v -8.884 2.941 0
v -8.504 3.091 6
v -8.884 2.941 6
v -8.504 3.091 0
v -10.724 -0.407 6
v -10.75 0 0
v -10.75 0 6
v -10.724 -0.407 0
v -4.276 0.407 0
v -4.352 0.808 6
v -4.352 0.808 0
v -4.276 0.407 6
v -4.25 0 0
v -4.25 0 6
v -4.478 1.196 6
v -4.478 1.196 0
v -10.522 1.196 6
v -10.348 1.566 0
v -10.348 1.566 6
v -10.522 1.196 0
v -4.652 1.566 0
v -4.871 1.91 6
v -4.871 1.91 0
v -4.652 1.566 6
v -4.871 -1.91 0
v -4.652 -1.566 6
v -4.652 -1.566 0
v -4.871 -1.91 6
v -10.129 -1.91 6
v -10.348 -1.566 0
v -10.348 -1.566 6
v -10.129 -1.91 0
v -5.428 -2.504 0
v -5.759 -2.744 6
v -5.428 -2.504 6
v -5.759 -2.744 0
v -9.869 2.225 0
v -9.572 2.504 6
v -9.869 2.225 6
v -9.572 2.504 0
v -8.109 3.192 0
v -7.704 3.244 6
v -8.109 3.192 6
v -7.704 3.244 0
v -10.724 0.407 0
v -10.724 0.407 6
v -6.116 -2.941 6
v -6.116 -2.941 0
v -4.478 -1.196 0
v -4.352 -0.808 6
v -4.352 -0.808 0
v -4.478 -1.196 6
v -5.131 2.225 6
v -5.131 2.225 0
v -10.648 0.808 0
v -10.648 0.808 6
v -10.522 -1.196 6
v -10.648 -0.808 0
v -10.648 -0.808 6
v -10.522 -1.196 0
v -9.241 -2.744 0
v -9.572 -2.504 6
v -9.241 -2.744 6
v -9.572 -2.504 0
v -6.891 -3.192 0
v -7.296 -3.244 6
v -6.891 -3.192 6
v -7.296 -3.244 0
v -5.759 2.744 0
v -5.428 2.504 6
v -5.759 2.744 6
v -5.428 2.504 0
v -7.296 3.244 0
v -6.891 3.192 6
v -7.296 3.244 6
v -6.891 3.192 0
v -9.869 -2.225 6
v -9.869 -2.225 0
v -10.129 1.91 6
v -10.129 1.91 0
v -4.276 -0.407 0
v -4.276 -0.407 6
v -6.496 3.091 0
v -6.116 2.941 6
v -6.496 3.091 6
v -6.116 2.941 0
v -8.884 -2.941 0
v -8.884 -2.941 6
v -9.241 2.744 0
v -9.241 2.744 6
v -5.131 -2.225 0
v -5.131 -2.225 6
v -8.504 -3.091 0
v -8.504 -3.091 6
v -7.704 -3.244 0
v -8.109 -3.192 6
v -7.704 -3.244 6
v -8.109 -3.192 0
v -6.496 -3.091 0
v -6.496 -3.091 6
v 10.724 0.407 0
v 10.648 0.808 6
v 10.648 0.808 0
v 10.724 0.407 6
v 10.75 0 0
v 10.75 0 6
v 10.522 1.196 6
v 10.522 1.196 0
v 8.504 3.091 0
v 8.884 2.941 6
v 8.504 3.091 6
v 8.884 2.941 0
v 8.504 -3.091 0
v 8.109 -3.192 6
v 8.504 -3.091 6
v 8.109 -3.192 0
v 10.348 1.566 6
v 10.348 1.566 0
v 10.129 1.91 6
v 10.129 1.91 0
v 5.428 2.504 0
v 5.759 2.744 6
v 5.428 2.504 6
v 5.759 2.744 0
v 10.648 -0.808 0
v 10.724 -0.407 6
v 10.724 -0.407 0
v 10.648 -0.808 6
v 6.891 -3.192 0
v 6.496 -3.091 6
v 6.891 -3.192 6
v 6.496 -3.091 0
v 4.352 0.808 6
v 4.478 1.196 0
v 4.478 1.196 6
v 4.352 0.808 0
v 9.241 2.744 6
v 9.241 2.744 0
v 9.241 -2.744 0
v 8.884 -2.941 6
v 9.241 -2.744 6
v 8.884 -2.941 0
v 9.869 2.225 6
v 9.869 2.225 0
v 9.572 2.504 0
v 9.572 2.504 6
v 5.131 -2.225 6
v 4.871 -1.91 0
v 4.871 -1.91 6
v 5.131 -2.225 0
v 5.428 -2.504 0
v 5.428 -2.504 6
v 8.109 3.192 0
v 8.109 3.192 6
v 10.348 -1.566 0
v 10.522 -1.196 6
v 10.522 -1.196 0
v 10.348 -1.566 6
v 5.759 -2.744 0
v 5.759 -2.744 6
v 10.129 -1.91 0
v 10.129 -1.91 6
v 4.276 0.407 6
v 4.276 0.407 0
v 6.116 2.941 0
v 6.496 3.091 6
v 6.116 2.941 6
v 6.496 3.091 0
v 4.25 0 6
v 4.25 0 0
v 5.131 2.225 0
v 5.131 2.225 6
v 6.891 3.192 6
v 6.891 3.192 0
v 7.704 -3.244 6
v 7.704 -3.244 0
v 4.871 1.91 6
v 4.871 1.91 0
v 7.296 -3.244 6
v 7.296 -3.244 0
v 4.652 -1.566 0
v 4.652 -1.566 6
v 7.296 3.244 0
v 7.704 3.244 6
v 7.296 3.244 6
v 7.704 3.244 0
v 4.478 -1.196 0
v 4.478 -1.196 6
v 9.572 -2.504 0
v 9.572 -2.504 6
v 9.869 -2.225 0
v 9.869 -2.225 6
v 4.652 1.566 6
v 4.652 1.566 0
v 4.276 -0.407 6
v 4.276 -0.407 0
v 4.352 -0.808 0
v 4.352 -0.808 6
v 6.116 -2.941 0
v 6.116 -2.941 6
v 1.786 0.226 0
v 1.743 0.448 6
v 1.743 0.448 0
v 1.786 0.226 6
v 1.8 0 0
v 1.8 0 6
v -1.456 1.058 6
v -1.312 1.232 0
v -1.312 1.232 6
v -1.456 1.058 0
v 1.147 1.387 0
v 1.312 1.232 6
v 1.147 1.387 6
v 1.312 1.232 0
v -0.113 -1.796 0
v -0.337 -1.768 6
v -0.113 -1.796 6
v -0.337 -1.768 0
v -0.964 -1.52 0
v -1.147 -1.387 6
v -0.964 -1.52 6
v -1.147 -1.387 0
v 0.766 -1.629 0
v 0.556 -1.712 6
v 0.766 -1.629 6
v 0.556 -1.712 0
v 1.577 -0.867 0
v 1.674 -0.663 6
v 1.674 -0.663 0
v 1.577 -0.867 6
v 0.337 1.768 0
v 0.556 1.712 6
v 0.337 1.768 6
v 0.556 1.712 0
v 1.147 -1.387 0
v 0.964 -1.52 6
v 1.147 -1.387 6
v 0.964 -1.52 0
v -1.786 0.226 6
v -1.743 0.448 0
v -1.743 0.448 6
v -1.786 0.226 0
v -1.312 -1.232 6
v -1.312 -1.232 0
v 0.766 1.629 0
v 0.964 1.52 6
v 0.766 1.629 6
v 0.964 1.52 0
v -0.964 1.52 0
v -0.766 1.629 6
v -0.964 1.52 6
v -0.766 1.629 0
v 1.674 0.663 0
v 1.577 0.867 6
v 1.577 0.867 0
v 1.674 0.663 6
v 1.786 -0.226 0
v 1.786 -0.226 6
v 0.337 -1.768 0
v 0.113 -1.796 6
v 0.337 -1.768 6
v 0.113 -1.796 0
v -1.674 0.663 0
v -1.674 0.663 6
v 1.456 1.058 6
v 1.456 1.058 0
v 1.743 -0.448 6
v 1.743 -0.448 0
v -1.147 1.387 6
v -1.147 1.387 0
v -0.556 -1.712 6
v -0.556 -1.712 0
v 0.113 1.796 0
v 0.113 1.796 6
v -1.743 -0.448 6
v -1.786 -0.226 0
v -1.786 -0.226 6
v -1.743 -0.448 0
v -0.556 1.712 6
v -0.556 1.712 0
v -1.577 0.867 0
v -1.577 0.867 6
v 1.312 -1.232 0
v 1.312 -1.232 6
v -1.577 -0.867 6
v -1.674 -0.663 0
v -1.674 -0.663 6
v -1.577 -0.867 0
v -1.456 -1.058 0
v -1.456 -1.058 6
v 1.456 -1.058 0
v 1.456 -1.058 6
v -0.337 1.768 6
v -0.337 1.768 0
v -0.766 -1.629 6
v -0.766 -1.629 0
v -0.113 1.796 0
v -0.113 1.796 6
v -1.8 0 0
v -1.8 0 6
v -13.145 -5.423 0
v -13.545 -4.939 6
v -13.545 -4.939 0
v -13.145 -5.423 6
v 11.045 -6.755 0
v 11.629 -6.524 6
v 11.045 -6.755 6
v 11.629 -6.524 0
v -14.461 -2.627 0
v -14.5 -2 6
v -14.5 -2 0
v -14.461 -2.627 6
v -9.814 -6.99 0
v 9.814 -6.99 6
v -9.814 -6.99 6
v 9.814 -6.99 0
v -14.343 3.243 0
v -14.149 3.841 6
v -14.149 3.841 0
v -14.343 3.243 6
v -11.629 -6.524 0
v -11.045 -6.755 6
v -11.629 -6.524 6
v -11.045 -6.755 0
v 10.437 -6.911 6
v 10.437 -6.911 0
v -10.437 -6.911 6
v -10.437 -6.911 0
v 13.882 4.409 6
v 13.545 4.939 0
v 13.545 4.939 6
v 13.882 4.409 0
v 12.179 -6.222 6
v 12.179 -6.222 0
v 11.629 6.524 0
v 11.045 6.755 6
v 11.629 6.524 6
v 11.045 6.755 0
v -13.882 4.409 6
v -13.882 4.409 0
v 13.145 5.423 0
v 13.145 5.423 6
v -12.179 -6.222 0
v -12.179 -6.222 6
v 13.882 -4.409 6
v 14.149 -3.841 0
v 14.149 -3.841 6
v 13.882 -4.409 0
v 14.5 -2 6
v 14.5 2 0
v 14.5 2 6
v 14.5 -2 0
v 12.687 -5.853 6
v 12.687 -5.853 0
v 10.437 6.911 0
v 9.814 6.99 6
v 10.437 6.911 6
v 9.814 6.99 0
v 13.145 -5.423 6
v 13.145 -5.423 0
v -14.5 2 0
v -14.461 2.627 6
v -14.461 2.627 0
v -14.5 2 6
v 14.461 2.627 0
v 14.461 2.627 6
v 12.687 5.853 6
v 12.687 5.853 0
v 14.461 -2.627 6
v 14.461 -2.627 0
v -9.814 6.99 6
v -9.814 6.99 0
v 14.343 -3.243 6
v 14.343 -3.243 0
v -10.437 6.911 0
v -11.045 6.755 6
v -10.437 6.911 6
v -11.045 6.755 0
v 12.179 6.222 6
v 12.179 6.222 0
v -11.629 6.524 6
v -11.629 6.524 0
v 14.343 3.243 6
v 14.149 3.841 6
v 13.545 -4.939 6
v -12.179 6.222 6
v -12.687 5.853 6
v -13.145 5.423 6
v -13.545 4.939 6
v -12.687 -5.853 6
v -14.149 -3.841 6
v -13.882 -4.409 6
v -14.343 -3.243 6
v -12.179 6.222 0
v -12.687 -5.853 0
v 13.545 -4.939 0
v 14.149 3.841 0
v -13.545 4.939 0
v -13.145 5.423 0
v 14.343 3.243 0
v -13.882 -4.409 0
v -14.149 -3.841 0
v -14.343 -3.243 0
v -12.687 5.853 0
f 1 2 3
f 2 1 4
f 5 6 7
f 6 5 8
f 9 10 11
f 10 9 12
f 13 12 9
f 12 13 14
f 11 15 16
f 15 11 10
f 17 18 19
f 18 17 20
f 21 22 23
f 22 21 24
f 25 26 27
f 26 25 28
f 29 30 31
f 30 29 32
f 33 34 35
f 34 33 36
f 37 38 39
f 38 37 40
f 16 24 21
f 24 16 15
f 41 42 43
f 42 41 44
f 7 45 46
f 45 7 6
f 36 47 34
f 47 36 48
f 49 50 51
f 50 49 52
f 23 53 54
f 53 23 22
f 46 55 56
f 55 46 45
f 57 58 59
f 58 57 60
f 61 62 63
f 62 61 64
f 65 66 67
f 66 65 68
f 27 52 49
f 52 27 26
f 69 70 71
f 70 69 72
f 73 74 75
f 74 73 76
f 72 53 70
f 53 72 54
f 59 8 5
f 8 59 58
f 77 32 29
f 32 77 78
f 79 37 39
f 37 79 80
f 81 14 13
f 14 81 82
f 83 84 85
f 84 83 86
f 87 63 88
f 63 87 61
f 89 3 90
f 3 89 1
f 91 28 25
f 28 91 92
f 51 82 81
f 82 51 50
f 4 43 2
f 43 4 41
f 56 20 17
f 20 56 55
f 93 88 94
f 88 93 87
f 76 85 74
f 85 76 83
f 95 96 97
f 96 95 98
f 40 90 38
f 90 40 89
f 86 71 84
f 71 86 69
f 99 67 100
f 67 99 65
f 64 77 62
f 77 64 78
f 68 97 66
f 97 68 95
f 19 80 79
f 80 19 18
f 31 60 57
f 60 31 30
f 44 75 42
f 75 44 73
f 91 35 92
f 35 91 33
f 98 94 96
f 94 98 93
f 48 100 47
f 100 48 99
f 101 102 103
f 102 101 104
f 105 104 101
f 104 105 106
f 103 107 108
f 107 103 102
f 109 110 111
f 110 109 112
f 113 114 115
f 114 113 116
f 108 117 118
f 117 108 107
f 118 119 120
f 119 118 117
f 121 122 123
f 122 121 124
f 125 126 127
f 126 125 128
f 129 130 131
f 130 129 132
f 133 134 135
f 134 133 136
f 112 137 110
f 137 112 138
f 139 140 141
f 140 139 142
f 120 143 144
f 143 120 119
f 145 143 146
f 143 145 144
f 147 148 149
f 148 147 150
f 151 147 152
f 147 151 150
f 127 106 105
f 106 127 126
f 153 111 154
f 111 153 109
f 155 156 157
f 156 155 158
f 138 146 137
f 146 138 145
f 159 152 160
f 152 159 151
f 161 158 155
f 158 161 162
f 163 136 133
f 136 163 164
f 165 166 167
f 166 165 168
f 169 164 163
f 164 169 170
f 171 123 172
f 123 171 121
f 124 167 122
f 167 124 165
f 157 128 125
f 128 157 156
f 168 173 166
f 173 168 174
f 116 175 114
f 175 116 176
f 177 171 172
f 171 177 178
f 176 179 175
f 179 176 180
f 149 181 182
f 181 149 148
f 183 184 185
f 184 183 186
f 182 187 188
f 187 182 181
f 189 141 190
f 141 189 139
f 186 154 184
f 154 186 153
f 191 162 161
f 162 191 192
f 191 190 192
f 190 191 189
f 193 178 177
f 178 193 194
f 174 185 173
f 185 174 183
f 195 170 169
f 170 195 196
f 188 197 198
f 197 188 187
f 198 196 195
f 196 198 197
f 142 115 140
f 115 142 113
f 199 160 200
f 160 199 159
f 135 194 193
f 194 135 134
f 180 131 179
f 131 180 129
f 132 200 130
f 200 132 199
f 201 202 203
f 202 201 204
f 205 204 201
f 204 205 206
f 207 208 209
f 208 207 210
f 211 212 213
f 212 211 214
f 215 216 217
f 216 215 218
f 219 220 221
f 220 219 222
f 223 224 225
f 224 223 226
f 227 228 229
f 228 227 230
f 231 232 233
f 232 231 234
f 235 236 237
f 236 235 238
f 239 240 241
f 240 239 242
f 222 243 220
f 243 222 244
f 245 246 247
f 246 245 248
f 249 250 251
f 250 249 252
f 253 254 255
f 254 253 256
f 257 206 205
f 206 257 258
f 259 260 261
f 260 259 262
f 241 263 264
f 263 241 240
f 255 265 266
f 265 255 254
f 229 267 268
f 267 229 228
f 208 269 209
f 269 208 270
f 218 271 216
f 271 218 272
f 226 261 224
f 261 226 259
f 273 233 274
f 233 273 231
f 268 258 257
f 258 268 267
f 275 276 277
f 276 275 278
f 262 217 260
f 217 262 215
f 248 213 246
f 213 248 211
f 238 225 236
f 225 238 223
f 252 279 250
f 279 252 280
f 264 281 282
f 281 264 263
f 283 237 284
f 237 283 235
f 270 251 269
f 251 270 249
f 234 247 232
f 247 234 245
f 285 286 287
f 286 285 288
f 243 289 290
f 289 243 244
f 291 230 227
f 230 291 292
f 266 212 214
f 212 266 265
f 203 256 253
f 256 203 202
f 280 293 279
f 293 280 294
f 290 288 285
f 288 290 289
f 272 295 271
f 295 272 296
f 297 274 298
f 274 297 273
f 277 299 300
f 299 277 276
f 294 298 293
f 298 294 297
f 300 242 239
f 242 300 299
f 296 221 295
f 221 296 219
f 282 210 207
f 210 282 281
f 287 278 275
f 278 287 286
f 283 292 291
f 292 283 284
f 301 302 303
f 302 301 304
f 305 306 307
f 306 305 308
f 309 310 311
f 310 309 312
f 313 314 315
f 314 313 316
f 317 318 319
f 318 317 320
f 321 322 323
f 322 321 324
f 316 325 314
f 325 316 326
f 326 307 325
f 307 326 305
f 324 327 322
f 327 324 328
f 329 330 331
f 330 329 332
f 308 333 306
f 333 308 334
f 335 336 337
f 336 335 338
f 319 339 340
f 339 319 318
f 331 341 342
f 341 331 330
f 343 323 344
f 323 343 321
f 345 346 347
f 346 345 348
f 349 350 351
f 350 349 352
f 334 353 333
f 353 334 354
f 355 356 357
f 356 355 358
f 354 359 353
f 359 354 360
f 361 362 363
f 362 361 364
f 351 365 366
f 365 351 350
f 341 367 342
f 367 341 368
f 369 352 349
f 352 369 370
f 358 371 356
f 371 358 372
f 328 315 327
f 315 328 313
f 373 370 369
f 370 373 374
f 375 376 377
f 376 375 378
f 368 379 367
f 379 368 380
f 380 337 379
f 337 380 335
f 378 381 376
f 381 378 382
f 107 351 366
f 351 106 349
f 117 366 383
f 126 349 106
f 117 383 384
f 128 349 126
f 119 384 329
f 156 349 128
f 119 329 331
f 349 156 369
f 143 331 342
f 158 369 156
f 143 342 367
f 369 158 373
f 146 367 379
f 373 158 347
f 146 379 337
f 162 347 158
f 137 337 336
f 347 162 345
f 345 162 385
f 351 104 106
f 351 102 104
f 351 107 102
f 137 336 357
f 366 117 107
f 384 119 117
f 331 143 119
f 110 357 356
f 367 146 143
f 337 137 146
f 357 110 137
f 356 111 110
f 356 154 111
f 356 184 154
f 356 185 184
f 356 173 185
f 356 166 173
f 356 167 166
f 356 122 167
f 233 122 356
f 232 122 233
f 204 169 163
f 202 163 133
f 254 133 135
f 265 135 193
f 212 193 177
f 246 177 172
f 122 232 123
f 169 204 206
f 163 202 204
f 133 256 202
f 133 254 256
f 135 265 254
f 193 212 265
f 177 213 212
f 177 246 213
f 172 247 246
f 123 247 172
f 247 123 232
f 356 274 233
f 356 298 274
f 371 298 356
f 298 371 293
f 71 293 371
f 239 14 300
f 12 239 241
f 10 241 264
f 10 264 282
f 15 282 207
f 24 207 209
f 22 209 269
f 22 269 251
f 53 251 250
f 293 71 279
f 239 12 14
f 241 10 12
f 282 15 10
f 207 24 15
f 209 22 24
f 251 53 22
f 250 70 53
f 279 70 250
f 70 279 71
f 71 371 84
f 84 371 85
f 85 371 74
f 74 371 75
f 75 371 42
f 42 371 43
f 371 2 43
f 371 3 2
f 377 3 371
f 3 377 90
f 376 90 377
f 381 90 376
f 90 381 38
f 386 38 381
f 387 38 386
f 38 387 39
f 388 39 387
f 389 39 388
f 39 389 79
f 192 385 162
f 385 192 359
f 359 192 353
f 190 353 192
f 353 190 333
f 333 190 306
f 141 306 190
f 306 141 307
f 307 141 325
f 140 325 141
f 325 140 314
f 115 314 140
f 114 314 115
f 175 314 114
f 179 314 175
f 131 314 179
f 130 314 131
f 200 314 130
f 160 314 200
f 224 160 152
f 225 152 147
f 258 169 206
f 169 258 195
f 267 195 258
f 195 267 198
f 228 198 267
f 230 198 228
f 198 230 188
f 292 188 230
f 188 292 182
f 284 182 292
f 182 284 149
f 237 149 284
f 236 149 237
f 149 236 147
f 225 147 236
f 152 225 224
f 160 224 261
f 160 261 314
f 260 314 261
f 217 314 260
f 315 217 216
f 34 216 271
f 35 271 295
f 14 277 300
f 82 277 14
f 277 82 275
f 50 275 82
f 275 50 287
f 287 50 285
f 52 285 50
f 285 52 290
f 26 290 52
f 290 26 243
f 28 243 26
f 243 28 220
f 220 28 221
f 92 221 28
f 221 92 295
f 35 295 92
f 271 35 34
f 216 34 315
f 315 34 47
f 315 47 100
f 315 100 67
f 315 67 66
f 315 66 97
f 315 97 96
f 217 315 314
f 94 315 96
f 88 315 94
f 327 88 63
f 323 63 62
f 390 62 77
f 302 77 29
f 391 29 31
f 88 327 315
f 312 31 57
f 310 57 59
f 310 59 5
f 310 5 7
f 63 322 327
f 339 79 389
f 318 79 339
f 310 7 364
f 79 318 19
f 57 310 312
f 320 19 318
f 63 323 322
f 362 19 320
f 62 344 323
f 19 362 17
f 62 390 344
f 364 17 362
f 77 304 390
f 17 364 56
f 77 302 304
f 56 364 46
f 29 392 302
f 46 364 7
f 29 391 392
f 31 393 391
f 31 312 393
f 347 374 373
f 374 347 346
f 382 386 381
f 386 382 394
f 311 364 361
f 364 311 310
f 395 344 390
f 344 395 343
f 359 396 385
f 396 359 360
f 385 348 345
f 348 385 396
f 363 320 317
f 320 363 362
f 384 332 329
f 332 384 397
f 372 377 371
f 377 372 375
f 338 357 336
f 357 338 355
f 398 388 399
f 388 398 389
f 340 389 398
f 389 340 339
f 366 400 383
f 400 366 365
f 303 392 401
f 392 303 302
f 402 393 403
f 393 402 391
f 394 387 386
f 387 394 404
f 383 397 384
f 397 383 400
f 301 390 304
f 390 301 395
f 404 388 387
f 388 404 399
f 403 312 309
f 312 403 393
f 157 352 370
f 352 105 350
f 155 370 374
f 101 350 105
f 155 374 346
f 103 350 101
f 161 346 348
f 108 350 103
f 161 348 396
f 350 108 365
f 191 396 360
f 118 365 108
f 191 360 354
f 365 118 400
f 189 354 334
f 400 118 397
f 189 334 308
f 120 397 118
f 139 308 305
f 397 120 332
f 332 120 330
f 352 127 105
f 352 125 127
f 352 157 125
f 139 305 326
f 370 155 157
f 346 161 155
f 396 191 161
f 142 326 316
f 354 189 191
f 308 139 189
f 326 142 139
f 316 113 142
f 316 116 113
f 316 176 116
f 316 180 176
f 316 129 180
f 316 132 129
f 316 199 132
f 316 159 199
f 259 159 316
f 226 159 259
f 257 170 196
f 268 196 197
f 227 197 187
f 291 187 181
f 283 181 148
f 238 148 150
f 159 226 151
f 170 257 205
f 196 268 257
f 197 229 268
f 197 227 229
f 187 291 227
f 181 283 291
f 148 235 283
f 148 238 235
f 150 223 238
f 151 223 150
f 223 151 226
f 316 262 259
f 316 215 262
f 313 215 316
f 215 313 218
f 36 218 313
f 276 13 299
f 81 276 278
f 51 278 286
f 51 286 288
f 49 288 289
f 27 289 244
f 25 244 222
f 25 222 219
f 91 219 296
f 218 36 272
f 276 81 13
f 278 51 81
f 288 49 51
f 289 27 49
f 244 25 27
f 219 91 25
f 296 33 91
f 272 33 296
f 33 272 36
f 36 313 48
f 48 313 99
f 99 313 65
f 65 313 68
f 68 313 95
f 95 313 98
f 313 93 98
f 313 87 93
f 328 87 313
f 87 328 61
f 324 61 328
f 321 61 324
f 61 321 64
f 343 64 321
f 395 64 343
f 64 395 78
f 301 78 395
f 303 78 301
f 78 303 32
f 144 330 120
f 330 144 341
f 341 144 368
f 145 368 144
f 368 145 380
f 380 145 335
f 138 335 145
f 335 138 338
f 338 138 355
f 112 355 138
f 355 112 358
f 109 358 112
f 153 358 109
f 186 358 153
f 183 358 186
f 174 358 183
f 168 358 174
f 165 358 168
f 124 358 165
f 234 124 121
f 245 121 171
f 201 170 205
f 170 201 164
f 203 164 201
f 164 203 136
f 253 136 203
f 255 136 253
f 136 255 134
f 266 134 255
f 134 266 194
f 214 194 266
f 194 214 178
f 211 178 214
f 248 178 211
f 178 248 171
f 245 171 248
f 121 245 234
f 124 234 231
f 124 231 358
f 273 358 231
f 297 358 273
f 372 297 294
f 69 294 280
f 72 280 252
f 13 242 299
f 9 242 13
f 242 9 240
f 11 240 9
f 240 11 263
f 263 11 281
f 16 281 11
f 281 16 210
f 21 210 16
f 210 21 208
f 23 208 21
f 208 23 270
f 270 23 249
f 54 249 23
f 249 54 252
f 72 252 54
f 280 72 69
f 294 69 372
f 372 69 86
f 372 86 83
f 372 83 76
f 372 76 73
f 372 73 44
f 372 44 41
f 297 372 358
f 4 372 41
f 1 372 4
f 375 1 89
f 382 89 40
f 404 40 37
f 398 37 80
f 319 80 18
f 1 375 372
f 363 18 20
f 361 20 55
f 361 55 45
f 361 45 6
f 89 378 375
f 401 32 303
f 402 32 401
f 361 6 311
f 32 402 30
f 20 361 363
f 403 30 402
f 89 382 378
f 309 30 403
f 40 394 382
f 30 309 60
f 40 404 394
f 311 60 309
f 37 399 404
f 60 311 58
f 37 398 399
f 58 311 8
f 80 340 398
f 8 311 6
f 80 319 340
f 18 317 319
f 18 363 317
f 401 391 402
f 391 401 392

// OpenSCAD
$fn = 50;


difference() {
	union() {
		*color(alpha = 1.0000000000, c = "gray") {
			translate(v = [0, 7, 0]) {
				linear_extrude(height = 1) {
					text(font = "Arial:style=Bold", halign = "center", size = 4.5000000000, text = "COMMENT plate main", valign = "center");
				}
			}
		}
		*color(alpha = 1.0000000000, c = "gray") {
			translate(v = [0, 14, 0]) {
				linear_extrude(height = 1) {
					text(font = "Arial:style=Bold", halign = "center", size = 4.5000000000, text = "COMMENT description oobb_plate_shape_p_type_6_depth_2_width_1_height_6_thickness_true_both_holes", valign = "center");
				}
			}
		}
		hull() {
			translate(v = [-9.5000000000, 2.0000000000, 0]) {
				cylinder(h = 6, r = 5);
			}
			translate(v = [9.5000000000, 2.0000000000, 0]) {
				cylinder(h = 6, r = 5);
			}
			translate(v = [-9.5000000000, -2.0000000000, 0]) {
				cylinder(h = 6, r = 5);
			}
			translate(v = [9.5000000000, -2.0000000000, 0]) {
				cylinder(h = 6, r = 5);
			}
		}
	}
	union() {
		*color(alpha = 1.0000000000, c = "gray") {
			translate(v = [0, 7, 0]) {
				linear_extrude(height = 1) {
					text(font = "Arial:style=Bold", halign = "center", size = 4.5000000000, text = "COMMENT holes main", valign = "center");
				}
			}
		}
		*color(alpha = 1.0000000000, c = "gray") {
			translate(v = [0, 14, 0]) {
				linear_extrude(height = 1) {
					text(font = "Arial:style=Bold", halign = "center", size = 4.5000000000, text = "COMMENT description oobb_holes_shape_n_type_2_width_1_height_6_thickness_true_both_holes", valign = "center");
				}
			}
		}
		translate(v = [-7.5000000000, 0.0000000000, 0]) {
			translate(v = [0, 0, -50]) {
				cylinder(h = 100, r = 3.2500000000);
			}
		}
		translate(v = [7.5000000000, 0.0000000000, 0]) {
			translate(v = [0, 0, -50]) {
				cylinder(h = 100, r = 3.2500000000);
			}
		}
		translate(v = [-7.5000000000, 0.0000000000, 0]) {
			translate(v = [0, 0, -50]) {
				cylinder(h = 100, r = 1.8000000000);
			}
		}
		translate(v = [0, 0, -50]) {
			cylinder(h = 100, r = 1.8000000000);
		}
		translate(v = [7.5000000000, 0.0000000000, 0]) {
			translate(v = [0, 0, -50]) {
				cylinder(h = 100, r = 1.8000000000);
			}
		}
	}
}
